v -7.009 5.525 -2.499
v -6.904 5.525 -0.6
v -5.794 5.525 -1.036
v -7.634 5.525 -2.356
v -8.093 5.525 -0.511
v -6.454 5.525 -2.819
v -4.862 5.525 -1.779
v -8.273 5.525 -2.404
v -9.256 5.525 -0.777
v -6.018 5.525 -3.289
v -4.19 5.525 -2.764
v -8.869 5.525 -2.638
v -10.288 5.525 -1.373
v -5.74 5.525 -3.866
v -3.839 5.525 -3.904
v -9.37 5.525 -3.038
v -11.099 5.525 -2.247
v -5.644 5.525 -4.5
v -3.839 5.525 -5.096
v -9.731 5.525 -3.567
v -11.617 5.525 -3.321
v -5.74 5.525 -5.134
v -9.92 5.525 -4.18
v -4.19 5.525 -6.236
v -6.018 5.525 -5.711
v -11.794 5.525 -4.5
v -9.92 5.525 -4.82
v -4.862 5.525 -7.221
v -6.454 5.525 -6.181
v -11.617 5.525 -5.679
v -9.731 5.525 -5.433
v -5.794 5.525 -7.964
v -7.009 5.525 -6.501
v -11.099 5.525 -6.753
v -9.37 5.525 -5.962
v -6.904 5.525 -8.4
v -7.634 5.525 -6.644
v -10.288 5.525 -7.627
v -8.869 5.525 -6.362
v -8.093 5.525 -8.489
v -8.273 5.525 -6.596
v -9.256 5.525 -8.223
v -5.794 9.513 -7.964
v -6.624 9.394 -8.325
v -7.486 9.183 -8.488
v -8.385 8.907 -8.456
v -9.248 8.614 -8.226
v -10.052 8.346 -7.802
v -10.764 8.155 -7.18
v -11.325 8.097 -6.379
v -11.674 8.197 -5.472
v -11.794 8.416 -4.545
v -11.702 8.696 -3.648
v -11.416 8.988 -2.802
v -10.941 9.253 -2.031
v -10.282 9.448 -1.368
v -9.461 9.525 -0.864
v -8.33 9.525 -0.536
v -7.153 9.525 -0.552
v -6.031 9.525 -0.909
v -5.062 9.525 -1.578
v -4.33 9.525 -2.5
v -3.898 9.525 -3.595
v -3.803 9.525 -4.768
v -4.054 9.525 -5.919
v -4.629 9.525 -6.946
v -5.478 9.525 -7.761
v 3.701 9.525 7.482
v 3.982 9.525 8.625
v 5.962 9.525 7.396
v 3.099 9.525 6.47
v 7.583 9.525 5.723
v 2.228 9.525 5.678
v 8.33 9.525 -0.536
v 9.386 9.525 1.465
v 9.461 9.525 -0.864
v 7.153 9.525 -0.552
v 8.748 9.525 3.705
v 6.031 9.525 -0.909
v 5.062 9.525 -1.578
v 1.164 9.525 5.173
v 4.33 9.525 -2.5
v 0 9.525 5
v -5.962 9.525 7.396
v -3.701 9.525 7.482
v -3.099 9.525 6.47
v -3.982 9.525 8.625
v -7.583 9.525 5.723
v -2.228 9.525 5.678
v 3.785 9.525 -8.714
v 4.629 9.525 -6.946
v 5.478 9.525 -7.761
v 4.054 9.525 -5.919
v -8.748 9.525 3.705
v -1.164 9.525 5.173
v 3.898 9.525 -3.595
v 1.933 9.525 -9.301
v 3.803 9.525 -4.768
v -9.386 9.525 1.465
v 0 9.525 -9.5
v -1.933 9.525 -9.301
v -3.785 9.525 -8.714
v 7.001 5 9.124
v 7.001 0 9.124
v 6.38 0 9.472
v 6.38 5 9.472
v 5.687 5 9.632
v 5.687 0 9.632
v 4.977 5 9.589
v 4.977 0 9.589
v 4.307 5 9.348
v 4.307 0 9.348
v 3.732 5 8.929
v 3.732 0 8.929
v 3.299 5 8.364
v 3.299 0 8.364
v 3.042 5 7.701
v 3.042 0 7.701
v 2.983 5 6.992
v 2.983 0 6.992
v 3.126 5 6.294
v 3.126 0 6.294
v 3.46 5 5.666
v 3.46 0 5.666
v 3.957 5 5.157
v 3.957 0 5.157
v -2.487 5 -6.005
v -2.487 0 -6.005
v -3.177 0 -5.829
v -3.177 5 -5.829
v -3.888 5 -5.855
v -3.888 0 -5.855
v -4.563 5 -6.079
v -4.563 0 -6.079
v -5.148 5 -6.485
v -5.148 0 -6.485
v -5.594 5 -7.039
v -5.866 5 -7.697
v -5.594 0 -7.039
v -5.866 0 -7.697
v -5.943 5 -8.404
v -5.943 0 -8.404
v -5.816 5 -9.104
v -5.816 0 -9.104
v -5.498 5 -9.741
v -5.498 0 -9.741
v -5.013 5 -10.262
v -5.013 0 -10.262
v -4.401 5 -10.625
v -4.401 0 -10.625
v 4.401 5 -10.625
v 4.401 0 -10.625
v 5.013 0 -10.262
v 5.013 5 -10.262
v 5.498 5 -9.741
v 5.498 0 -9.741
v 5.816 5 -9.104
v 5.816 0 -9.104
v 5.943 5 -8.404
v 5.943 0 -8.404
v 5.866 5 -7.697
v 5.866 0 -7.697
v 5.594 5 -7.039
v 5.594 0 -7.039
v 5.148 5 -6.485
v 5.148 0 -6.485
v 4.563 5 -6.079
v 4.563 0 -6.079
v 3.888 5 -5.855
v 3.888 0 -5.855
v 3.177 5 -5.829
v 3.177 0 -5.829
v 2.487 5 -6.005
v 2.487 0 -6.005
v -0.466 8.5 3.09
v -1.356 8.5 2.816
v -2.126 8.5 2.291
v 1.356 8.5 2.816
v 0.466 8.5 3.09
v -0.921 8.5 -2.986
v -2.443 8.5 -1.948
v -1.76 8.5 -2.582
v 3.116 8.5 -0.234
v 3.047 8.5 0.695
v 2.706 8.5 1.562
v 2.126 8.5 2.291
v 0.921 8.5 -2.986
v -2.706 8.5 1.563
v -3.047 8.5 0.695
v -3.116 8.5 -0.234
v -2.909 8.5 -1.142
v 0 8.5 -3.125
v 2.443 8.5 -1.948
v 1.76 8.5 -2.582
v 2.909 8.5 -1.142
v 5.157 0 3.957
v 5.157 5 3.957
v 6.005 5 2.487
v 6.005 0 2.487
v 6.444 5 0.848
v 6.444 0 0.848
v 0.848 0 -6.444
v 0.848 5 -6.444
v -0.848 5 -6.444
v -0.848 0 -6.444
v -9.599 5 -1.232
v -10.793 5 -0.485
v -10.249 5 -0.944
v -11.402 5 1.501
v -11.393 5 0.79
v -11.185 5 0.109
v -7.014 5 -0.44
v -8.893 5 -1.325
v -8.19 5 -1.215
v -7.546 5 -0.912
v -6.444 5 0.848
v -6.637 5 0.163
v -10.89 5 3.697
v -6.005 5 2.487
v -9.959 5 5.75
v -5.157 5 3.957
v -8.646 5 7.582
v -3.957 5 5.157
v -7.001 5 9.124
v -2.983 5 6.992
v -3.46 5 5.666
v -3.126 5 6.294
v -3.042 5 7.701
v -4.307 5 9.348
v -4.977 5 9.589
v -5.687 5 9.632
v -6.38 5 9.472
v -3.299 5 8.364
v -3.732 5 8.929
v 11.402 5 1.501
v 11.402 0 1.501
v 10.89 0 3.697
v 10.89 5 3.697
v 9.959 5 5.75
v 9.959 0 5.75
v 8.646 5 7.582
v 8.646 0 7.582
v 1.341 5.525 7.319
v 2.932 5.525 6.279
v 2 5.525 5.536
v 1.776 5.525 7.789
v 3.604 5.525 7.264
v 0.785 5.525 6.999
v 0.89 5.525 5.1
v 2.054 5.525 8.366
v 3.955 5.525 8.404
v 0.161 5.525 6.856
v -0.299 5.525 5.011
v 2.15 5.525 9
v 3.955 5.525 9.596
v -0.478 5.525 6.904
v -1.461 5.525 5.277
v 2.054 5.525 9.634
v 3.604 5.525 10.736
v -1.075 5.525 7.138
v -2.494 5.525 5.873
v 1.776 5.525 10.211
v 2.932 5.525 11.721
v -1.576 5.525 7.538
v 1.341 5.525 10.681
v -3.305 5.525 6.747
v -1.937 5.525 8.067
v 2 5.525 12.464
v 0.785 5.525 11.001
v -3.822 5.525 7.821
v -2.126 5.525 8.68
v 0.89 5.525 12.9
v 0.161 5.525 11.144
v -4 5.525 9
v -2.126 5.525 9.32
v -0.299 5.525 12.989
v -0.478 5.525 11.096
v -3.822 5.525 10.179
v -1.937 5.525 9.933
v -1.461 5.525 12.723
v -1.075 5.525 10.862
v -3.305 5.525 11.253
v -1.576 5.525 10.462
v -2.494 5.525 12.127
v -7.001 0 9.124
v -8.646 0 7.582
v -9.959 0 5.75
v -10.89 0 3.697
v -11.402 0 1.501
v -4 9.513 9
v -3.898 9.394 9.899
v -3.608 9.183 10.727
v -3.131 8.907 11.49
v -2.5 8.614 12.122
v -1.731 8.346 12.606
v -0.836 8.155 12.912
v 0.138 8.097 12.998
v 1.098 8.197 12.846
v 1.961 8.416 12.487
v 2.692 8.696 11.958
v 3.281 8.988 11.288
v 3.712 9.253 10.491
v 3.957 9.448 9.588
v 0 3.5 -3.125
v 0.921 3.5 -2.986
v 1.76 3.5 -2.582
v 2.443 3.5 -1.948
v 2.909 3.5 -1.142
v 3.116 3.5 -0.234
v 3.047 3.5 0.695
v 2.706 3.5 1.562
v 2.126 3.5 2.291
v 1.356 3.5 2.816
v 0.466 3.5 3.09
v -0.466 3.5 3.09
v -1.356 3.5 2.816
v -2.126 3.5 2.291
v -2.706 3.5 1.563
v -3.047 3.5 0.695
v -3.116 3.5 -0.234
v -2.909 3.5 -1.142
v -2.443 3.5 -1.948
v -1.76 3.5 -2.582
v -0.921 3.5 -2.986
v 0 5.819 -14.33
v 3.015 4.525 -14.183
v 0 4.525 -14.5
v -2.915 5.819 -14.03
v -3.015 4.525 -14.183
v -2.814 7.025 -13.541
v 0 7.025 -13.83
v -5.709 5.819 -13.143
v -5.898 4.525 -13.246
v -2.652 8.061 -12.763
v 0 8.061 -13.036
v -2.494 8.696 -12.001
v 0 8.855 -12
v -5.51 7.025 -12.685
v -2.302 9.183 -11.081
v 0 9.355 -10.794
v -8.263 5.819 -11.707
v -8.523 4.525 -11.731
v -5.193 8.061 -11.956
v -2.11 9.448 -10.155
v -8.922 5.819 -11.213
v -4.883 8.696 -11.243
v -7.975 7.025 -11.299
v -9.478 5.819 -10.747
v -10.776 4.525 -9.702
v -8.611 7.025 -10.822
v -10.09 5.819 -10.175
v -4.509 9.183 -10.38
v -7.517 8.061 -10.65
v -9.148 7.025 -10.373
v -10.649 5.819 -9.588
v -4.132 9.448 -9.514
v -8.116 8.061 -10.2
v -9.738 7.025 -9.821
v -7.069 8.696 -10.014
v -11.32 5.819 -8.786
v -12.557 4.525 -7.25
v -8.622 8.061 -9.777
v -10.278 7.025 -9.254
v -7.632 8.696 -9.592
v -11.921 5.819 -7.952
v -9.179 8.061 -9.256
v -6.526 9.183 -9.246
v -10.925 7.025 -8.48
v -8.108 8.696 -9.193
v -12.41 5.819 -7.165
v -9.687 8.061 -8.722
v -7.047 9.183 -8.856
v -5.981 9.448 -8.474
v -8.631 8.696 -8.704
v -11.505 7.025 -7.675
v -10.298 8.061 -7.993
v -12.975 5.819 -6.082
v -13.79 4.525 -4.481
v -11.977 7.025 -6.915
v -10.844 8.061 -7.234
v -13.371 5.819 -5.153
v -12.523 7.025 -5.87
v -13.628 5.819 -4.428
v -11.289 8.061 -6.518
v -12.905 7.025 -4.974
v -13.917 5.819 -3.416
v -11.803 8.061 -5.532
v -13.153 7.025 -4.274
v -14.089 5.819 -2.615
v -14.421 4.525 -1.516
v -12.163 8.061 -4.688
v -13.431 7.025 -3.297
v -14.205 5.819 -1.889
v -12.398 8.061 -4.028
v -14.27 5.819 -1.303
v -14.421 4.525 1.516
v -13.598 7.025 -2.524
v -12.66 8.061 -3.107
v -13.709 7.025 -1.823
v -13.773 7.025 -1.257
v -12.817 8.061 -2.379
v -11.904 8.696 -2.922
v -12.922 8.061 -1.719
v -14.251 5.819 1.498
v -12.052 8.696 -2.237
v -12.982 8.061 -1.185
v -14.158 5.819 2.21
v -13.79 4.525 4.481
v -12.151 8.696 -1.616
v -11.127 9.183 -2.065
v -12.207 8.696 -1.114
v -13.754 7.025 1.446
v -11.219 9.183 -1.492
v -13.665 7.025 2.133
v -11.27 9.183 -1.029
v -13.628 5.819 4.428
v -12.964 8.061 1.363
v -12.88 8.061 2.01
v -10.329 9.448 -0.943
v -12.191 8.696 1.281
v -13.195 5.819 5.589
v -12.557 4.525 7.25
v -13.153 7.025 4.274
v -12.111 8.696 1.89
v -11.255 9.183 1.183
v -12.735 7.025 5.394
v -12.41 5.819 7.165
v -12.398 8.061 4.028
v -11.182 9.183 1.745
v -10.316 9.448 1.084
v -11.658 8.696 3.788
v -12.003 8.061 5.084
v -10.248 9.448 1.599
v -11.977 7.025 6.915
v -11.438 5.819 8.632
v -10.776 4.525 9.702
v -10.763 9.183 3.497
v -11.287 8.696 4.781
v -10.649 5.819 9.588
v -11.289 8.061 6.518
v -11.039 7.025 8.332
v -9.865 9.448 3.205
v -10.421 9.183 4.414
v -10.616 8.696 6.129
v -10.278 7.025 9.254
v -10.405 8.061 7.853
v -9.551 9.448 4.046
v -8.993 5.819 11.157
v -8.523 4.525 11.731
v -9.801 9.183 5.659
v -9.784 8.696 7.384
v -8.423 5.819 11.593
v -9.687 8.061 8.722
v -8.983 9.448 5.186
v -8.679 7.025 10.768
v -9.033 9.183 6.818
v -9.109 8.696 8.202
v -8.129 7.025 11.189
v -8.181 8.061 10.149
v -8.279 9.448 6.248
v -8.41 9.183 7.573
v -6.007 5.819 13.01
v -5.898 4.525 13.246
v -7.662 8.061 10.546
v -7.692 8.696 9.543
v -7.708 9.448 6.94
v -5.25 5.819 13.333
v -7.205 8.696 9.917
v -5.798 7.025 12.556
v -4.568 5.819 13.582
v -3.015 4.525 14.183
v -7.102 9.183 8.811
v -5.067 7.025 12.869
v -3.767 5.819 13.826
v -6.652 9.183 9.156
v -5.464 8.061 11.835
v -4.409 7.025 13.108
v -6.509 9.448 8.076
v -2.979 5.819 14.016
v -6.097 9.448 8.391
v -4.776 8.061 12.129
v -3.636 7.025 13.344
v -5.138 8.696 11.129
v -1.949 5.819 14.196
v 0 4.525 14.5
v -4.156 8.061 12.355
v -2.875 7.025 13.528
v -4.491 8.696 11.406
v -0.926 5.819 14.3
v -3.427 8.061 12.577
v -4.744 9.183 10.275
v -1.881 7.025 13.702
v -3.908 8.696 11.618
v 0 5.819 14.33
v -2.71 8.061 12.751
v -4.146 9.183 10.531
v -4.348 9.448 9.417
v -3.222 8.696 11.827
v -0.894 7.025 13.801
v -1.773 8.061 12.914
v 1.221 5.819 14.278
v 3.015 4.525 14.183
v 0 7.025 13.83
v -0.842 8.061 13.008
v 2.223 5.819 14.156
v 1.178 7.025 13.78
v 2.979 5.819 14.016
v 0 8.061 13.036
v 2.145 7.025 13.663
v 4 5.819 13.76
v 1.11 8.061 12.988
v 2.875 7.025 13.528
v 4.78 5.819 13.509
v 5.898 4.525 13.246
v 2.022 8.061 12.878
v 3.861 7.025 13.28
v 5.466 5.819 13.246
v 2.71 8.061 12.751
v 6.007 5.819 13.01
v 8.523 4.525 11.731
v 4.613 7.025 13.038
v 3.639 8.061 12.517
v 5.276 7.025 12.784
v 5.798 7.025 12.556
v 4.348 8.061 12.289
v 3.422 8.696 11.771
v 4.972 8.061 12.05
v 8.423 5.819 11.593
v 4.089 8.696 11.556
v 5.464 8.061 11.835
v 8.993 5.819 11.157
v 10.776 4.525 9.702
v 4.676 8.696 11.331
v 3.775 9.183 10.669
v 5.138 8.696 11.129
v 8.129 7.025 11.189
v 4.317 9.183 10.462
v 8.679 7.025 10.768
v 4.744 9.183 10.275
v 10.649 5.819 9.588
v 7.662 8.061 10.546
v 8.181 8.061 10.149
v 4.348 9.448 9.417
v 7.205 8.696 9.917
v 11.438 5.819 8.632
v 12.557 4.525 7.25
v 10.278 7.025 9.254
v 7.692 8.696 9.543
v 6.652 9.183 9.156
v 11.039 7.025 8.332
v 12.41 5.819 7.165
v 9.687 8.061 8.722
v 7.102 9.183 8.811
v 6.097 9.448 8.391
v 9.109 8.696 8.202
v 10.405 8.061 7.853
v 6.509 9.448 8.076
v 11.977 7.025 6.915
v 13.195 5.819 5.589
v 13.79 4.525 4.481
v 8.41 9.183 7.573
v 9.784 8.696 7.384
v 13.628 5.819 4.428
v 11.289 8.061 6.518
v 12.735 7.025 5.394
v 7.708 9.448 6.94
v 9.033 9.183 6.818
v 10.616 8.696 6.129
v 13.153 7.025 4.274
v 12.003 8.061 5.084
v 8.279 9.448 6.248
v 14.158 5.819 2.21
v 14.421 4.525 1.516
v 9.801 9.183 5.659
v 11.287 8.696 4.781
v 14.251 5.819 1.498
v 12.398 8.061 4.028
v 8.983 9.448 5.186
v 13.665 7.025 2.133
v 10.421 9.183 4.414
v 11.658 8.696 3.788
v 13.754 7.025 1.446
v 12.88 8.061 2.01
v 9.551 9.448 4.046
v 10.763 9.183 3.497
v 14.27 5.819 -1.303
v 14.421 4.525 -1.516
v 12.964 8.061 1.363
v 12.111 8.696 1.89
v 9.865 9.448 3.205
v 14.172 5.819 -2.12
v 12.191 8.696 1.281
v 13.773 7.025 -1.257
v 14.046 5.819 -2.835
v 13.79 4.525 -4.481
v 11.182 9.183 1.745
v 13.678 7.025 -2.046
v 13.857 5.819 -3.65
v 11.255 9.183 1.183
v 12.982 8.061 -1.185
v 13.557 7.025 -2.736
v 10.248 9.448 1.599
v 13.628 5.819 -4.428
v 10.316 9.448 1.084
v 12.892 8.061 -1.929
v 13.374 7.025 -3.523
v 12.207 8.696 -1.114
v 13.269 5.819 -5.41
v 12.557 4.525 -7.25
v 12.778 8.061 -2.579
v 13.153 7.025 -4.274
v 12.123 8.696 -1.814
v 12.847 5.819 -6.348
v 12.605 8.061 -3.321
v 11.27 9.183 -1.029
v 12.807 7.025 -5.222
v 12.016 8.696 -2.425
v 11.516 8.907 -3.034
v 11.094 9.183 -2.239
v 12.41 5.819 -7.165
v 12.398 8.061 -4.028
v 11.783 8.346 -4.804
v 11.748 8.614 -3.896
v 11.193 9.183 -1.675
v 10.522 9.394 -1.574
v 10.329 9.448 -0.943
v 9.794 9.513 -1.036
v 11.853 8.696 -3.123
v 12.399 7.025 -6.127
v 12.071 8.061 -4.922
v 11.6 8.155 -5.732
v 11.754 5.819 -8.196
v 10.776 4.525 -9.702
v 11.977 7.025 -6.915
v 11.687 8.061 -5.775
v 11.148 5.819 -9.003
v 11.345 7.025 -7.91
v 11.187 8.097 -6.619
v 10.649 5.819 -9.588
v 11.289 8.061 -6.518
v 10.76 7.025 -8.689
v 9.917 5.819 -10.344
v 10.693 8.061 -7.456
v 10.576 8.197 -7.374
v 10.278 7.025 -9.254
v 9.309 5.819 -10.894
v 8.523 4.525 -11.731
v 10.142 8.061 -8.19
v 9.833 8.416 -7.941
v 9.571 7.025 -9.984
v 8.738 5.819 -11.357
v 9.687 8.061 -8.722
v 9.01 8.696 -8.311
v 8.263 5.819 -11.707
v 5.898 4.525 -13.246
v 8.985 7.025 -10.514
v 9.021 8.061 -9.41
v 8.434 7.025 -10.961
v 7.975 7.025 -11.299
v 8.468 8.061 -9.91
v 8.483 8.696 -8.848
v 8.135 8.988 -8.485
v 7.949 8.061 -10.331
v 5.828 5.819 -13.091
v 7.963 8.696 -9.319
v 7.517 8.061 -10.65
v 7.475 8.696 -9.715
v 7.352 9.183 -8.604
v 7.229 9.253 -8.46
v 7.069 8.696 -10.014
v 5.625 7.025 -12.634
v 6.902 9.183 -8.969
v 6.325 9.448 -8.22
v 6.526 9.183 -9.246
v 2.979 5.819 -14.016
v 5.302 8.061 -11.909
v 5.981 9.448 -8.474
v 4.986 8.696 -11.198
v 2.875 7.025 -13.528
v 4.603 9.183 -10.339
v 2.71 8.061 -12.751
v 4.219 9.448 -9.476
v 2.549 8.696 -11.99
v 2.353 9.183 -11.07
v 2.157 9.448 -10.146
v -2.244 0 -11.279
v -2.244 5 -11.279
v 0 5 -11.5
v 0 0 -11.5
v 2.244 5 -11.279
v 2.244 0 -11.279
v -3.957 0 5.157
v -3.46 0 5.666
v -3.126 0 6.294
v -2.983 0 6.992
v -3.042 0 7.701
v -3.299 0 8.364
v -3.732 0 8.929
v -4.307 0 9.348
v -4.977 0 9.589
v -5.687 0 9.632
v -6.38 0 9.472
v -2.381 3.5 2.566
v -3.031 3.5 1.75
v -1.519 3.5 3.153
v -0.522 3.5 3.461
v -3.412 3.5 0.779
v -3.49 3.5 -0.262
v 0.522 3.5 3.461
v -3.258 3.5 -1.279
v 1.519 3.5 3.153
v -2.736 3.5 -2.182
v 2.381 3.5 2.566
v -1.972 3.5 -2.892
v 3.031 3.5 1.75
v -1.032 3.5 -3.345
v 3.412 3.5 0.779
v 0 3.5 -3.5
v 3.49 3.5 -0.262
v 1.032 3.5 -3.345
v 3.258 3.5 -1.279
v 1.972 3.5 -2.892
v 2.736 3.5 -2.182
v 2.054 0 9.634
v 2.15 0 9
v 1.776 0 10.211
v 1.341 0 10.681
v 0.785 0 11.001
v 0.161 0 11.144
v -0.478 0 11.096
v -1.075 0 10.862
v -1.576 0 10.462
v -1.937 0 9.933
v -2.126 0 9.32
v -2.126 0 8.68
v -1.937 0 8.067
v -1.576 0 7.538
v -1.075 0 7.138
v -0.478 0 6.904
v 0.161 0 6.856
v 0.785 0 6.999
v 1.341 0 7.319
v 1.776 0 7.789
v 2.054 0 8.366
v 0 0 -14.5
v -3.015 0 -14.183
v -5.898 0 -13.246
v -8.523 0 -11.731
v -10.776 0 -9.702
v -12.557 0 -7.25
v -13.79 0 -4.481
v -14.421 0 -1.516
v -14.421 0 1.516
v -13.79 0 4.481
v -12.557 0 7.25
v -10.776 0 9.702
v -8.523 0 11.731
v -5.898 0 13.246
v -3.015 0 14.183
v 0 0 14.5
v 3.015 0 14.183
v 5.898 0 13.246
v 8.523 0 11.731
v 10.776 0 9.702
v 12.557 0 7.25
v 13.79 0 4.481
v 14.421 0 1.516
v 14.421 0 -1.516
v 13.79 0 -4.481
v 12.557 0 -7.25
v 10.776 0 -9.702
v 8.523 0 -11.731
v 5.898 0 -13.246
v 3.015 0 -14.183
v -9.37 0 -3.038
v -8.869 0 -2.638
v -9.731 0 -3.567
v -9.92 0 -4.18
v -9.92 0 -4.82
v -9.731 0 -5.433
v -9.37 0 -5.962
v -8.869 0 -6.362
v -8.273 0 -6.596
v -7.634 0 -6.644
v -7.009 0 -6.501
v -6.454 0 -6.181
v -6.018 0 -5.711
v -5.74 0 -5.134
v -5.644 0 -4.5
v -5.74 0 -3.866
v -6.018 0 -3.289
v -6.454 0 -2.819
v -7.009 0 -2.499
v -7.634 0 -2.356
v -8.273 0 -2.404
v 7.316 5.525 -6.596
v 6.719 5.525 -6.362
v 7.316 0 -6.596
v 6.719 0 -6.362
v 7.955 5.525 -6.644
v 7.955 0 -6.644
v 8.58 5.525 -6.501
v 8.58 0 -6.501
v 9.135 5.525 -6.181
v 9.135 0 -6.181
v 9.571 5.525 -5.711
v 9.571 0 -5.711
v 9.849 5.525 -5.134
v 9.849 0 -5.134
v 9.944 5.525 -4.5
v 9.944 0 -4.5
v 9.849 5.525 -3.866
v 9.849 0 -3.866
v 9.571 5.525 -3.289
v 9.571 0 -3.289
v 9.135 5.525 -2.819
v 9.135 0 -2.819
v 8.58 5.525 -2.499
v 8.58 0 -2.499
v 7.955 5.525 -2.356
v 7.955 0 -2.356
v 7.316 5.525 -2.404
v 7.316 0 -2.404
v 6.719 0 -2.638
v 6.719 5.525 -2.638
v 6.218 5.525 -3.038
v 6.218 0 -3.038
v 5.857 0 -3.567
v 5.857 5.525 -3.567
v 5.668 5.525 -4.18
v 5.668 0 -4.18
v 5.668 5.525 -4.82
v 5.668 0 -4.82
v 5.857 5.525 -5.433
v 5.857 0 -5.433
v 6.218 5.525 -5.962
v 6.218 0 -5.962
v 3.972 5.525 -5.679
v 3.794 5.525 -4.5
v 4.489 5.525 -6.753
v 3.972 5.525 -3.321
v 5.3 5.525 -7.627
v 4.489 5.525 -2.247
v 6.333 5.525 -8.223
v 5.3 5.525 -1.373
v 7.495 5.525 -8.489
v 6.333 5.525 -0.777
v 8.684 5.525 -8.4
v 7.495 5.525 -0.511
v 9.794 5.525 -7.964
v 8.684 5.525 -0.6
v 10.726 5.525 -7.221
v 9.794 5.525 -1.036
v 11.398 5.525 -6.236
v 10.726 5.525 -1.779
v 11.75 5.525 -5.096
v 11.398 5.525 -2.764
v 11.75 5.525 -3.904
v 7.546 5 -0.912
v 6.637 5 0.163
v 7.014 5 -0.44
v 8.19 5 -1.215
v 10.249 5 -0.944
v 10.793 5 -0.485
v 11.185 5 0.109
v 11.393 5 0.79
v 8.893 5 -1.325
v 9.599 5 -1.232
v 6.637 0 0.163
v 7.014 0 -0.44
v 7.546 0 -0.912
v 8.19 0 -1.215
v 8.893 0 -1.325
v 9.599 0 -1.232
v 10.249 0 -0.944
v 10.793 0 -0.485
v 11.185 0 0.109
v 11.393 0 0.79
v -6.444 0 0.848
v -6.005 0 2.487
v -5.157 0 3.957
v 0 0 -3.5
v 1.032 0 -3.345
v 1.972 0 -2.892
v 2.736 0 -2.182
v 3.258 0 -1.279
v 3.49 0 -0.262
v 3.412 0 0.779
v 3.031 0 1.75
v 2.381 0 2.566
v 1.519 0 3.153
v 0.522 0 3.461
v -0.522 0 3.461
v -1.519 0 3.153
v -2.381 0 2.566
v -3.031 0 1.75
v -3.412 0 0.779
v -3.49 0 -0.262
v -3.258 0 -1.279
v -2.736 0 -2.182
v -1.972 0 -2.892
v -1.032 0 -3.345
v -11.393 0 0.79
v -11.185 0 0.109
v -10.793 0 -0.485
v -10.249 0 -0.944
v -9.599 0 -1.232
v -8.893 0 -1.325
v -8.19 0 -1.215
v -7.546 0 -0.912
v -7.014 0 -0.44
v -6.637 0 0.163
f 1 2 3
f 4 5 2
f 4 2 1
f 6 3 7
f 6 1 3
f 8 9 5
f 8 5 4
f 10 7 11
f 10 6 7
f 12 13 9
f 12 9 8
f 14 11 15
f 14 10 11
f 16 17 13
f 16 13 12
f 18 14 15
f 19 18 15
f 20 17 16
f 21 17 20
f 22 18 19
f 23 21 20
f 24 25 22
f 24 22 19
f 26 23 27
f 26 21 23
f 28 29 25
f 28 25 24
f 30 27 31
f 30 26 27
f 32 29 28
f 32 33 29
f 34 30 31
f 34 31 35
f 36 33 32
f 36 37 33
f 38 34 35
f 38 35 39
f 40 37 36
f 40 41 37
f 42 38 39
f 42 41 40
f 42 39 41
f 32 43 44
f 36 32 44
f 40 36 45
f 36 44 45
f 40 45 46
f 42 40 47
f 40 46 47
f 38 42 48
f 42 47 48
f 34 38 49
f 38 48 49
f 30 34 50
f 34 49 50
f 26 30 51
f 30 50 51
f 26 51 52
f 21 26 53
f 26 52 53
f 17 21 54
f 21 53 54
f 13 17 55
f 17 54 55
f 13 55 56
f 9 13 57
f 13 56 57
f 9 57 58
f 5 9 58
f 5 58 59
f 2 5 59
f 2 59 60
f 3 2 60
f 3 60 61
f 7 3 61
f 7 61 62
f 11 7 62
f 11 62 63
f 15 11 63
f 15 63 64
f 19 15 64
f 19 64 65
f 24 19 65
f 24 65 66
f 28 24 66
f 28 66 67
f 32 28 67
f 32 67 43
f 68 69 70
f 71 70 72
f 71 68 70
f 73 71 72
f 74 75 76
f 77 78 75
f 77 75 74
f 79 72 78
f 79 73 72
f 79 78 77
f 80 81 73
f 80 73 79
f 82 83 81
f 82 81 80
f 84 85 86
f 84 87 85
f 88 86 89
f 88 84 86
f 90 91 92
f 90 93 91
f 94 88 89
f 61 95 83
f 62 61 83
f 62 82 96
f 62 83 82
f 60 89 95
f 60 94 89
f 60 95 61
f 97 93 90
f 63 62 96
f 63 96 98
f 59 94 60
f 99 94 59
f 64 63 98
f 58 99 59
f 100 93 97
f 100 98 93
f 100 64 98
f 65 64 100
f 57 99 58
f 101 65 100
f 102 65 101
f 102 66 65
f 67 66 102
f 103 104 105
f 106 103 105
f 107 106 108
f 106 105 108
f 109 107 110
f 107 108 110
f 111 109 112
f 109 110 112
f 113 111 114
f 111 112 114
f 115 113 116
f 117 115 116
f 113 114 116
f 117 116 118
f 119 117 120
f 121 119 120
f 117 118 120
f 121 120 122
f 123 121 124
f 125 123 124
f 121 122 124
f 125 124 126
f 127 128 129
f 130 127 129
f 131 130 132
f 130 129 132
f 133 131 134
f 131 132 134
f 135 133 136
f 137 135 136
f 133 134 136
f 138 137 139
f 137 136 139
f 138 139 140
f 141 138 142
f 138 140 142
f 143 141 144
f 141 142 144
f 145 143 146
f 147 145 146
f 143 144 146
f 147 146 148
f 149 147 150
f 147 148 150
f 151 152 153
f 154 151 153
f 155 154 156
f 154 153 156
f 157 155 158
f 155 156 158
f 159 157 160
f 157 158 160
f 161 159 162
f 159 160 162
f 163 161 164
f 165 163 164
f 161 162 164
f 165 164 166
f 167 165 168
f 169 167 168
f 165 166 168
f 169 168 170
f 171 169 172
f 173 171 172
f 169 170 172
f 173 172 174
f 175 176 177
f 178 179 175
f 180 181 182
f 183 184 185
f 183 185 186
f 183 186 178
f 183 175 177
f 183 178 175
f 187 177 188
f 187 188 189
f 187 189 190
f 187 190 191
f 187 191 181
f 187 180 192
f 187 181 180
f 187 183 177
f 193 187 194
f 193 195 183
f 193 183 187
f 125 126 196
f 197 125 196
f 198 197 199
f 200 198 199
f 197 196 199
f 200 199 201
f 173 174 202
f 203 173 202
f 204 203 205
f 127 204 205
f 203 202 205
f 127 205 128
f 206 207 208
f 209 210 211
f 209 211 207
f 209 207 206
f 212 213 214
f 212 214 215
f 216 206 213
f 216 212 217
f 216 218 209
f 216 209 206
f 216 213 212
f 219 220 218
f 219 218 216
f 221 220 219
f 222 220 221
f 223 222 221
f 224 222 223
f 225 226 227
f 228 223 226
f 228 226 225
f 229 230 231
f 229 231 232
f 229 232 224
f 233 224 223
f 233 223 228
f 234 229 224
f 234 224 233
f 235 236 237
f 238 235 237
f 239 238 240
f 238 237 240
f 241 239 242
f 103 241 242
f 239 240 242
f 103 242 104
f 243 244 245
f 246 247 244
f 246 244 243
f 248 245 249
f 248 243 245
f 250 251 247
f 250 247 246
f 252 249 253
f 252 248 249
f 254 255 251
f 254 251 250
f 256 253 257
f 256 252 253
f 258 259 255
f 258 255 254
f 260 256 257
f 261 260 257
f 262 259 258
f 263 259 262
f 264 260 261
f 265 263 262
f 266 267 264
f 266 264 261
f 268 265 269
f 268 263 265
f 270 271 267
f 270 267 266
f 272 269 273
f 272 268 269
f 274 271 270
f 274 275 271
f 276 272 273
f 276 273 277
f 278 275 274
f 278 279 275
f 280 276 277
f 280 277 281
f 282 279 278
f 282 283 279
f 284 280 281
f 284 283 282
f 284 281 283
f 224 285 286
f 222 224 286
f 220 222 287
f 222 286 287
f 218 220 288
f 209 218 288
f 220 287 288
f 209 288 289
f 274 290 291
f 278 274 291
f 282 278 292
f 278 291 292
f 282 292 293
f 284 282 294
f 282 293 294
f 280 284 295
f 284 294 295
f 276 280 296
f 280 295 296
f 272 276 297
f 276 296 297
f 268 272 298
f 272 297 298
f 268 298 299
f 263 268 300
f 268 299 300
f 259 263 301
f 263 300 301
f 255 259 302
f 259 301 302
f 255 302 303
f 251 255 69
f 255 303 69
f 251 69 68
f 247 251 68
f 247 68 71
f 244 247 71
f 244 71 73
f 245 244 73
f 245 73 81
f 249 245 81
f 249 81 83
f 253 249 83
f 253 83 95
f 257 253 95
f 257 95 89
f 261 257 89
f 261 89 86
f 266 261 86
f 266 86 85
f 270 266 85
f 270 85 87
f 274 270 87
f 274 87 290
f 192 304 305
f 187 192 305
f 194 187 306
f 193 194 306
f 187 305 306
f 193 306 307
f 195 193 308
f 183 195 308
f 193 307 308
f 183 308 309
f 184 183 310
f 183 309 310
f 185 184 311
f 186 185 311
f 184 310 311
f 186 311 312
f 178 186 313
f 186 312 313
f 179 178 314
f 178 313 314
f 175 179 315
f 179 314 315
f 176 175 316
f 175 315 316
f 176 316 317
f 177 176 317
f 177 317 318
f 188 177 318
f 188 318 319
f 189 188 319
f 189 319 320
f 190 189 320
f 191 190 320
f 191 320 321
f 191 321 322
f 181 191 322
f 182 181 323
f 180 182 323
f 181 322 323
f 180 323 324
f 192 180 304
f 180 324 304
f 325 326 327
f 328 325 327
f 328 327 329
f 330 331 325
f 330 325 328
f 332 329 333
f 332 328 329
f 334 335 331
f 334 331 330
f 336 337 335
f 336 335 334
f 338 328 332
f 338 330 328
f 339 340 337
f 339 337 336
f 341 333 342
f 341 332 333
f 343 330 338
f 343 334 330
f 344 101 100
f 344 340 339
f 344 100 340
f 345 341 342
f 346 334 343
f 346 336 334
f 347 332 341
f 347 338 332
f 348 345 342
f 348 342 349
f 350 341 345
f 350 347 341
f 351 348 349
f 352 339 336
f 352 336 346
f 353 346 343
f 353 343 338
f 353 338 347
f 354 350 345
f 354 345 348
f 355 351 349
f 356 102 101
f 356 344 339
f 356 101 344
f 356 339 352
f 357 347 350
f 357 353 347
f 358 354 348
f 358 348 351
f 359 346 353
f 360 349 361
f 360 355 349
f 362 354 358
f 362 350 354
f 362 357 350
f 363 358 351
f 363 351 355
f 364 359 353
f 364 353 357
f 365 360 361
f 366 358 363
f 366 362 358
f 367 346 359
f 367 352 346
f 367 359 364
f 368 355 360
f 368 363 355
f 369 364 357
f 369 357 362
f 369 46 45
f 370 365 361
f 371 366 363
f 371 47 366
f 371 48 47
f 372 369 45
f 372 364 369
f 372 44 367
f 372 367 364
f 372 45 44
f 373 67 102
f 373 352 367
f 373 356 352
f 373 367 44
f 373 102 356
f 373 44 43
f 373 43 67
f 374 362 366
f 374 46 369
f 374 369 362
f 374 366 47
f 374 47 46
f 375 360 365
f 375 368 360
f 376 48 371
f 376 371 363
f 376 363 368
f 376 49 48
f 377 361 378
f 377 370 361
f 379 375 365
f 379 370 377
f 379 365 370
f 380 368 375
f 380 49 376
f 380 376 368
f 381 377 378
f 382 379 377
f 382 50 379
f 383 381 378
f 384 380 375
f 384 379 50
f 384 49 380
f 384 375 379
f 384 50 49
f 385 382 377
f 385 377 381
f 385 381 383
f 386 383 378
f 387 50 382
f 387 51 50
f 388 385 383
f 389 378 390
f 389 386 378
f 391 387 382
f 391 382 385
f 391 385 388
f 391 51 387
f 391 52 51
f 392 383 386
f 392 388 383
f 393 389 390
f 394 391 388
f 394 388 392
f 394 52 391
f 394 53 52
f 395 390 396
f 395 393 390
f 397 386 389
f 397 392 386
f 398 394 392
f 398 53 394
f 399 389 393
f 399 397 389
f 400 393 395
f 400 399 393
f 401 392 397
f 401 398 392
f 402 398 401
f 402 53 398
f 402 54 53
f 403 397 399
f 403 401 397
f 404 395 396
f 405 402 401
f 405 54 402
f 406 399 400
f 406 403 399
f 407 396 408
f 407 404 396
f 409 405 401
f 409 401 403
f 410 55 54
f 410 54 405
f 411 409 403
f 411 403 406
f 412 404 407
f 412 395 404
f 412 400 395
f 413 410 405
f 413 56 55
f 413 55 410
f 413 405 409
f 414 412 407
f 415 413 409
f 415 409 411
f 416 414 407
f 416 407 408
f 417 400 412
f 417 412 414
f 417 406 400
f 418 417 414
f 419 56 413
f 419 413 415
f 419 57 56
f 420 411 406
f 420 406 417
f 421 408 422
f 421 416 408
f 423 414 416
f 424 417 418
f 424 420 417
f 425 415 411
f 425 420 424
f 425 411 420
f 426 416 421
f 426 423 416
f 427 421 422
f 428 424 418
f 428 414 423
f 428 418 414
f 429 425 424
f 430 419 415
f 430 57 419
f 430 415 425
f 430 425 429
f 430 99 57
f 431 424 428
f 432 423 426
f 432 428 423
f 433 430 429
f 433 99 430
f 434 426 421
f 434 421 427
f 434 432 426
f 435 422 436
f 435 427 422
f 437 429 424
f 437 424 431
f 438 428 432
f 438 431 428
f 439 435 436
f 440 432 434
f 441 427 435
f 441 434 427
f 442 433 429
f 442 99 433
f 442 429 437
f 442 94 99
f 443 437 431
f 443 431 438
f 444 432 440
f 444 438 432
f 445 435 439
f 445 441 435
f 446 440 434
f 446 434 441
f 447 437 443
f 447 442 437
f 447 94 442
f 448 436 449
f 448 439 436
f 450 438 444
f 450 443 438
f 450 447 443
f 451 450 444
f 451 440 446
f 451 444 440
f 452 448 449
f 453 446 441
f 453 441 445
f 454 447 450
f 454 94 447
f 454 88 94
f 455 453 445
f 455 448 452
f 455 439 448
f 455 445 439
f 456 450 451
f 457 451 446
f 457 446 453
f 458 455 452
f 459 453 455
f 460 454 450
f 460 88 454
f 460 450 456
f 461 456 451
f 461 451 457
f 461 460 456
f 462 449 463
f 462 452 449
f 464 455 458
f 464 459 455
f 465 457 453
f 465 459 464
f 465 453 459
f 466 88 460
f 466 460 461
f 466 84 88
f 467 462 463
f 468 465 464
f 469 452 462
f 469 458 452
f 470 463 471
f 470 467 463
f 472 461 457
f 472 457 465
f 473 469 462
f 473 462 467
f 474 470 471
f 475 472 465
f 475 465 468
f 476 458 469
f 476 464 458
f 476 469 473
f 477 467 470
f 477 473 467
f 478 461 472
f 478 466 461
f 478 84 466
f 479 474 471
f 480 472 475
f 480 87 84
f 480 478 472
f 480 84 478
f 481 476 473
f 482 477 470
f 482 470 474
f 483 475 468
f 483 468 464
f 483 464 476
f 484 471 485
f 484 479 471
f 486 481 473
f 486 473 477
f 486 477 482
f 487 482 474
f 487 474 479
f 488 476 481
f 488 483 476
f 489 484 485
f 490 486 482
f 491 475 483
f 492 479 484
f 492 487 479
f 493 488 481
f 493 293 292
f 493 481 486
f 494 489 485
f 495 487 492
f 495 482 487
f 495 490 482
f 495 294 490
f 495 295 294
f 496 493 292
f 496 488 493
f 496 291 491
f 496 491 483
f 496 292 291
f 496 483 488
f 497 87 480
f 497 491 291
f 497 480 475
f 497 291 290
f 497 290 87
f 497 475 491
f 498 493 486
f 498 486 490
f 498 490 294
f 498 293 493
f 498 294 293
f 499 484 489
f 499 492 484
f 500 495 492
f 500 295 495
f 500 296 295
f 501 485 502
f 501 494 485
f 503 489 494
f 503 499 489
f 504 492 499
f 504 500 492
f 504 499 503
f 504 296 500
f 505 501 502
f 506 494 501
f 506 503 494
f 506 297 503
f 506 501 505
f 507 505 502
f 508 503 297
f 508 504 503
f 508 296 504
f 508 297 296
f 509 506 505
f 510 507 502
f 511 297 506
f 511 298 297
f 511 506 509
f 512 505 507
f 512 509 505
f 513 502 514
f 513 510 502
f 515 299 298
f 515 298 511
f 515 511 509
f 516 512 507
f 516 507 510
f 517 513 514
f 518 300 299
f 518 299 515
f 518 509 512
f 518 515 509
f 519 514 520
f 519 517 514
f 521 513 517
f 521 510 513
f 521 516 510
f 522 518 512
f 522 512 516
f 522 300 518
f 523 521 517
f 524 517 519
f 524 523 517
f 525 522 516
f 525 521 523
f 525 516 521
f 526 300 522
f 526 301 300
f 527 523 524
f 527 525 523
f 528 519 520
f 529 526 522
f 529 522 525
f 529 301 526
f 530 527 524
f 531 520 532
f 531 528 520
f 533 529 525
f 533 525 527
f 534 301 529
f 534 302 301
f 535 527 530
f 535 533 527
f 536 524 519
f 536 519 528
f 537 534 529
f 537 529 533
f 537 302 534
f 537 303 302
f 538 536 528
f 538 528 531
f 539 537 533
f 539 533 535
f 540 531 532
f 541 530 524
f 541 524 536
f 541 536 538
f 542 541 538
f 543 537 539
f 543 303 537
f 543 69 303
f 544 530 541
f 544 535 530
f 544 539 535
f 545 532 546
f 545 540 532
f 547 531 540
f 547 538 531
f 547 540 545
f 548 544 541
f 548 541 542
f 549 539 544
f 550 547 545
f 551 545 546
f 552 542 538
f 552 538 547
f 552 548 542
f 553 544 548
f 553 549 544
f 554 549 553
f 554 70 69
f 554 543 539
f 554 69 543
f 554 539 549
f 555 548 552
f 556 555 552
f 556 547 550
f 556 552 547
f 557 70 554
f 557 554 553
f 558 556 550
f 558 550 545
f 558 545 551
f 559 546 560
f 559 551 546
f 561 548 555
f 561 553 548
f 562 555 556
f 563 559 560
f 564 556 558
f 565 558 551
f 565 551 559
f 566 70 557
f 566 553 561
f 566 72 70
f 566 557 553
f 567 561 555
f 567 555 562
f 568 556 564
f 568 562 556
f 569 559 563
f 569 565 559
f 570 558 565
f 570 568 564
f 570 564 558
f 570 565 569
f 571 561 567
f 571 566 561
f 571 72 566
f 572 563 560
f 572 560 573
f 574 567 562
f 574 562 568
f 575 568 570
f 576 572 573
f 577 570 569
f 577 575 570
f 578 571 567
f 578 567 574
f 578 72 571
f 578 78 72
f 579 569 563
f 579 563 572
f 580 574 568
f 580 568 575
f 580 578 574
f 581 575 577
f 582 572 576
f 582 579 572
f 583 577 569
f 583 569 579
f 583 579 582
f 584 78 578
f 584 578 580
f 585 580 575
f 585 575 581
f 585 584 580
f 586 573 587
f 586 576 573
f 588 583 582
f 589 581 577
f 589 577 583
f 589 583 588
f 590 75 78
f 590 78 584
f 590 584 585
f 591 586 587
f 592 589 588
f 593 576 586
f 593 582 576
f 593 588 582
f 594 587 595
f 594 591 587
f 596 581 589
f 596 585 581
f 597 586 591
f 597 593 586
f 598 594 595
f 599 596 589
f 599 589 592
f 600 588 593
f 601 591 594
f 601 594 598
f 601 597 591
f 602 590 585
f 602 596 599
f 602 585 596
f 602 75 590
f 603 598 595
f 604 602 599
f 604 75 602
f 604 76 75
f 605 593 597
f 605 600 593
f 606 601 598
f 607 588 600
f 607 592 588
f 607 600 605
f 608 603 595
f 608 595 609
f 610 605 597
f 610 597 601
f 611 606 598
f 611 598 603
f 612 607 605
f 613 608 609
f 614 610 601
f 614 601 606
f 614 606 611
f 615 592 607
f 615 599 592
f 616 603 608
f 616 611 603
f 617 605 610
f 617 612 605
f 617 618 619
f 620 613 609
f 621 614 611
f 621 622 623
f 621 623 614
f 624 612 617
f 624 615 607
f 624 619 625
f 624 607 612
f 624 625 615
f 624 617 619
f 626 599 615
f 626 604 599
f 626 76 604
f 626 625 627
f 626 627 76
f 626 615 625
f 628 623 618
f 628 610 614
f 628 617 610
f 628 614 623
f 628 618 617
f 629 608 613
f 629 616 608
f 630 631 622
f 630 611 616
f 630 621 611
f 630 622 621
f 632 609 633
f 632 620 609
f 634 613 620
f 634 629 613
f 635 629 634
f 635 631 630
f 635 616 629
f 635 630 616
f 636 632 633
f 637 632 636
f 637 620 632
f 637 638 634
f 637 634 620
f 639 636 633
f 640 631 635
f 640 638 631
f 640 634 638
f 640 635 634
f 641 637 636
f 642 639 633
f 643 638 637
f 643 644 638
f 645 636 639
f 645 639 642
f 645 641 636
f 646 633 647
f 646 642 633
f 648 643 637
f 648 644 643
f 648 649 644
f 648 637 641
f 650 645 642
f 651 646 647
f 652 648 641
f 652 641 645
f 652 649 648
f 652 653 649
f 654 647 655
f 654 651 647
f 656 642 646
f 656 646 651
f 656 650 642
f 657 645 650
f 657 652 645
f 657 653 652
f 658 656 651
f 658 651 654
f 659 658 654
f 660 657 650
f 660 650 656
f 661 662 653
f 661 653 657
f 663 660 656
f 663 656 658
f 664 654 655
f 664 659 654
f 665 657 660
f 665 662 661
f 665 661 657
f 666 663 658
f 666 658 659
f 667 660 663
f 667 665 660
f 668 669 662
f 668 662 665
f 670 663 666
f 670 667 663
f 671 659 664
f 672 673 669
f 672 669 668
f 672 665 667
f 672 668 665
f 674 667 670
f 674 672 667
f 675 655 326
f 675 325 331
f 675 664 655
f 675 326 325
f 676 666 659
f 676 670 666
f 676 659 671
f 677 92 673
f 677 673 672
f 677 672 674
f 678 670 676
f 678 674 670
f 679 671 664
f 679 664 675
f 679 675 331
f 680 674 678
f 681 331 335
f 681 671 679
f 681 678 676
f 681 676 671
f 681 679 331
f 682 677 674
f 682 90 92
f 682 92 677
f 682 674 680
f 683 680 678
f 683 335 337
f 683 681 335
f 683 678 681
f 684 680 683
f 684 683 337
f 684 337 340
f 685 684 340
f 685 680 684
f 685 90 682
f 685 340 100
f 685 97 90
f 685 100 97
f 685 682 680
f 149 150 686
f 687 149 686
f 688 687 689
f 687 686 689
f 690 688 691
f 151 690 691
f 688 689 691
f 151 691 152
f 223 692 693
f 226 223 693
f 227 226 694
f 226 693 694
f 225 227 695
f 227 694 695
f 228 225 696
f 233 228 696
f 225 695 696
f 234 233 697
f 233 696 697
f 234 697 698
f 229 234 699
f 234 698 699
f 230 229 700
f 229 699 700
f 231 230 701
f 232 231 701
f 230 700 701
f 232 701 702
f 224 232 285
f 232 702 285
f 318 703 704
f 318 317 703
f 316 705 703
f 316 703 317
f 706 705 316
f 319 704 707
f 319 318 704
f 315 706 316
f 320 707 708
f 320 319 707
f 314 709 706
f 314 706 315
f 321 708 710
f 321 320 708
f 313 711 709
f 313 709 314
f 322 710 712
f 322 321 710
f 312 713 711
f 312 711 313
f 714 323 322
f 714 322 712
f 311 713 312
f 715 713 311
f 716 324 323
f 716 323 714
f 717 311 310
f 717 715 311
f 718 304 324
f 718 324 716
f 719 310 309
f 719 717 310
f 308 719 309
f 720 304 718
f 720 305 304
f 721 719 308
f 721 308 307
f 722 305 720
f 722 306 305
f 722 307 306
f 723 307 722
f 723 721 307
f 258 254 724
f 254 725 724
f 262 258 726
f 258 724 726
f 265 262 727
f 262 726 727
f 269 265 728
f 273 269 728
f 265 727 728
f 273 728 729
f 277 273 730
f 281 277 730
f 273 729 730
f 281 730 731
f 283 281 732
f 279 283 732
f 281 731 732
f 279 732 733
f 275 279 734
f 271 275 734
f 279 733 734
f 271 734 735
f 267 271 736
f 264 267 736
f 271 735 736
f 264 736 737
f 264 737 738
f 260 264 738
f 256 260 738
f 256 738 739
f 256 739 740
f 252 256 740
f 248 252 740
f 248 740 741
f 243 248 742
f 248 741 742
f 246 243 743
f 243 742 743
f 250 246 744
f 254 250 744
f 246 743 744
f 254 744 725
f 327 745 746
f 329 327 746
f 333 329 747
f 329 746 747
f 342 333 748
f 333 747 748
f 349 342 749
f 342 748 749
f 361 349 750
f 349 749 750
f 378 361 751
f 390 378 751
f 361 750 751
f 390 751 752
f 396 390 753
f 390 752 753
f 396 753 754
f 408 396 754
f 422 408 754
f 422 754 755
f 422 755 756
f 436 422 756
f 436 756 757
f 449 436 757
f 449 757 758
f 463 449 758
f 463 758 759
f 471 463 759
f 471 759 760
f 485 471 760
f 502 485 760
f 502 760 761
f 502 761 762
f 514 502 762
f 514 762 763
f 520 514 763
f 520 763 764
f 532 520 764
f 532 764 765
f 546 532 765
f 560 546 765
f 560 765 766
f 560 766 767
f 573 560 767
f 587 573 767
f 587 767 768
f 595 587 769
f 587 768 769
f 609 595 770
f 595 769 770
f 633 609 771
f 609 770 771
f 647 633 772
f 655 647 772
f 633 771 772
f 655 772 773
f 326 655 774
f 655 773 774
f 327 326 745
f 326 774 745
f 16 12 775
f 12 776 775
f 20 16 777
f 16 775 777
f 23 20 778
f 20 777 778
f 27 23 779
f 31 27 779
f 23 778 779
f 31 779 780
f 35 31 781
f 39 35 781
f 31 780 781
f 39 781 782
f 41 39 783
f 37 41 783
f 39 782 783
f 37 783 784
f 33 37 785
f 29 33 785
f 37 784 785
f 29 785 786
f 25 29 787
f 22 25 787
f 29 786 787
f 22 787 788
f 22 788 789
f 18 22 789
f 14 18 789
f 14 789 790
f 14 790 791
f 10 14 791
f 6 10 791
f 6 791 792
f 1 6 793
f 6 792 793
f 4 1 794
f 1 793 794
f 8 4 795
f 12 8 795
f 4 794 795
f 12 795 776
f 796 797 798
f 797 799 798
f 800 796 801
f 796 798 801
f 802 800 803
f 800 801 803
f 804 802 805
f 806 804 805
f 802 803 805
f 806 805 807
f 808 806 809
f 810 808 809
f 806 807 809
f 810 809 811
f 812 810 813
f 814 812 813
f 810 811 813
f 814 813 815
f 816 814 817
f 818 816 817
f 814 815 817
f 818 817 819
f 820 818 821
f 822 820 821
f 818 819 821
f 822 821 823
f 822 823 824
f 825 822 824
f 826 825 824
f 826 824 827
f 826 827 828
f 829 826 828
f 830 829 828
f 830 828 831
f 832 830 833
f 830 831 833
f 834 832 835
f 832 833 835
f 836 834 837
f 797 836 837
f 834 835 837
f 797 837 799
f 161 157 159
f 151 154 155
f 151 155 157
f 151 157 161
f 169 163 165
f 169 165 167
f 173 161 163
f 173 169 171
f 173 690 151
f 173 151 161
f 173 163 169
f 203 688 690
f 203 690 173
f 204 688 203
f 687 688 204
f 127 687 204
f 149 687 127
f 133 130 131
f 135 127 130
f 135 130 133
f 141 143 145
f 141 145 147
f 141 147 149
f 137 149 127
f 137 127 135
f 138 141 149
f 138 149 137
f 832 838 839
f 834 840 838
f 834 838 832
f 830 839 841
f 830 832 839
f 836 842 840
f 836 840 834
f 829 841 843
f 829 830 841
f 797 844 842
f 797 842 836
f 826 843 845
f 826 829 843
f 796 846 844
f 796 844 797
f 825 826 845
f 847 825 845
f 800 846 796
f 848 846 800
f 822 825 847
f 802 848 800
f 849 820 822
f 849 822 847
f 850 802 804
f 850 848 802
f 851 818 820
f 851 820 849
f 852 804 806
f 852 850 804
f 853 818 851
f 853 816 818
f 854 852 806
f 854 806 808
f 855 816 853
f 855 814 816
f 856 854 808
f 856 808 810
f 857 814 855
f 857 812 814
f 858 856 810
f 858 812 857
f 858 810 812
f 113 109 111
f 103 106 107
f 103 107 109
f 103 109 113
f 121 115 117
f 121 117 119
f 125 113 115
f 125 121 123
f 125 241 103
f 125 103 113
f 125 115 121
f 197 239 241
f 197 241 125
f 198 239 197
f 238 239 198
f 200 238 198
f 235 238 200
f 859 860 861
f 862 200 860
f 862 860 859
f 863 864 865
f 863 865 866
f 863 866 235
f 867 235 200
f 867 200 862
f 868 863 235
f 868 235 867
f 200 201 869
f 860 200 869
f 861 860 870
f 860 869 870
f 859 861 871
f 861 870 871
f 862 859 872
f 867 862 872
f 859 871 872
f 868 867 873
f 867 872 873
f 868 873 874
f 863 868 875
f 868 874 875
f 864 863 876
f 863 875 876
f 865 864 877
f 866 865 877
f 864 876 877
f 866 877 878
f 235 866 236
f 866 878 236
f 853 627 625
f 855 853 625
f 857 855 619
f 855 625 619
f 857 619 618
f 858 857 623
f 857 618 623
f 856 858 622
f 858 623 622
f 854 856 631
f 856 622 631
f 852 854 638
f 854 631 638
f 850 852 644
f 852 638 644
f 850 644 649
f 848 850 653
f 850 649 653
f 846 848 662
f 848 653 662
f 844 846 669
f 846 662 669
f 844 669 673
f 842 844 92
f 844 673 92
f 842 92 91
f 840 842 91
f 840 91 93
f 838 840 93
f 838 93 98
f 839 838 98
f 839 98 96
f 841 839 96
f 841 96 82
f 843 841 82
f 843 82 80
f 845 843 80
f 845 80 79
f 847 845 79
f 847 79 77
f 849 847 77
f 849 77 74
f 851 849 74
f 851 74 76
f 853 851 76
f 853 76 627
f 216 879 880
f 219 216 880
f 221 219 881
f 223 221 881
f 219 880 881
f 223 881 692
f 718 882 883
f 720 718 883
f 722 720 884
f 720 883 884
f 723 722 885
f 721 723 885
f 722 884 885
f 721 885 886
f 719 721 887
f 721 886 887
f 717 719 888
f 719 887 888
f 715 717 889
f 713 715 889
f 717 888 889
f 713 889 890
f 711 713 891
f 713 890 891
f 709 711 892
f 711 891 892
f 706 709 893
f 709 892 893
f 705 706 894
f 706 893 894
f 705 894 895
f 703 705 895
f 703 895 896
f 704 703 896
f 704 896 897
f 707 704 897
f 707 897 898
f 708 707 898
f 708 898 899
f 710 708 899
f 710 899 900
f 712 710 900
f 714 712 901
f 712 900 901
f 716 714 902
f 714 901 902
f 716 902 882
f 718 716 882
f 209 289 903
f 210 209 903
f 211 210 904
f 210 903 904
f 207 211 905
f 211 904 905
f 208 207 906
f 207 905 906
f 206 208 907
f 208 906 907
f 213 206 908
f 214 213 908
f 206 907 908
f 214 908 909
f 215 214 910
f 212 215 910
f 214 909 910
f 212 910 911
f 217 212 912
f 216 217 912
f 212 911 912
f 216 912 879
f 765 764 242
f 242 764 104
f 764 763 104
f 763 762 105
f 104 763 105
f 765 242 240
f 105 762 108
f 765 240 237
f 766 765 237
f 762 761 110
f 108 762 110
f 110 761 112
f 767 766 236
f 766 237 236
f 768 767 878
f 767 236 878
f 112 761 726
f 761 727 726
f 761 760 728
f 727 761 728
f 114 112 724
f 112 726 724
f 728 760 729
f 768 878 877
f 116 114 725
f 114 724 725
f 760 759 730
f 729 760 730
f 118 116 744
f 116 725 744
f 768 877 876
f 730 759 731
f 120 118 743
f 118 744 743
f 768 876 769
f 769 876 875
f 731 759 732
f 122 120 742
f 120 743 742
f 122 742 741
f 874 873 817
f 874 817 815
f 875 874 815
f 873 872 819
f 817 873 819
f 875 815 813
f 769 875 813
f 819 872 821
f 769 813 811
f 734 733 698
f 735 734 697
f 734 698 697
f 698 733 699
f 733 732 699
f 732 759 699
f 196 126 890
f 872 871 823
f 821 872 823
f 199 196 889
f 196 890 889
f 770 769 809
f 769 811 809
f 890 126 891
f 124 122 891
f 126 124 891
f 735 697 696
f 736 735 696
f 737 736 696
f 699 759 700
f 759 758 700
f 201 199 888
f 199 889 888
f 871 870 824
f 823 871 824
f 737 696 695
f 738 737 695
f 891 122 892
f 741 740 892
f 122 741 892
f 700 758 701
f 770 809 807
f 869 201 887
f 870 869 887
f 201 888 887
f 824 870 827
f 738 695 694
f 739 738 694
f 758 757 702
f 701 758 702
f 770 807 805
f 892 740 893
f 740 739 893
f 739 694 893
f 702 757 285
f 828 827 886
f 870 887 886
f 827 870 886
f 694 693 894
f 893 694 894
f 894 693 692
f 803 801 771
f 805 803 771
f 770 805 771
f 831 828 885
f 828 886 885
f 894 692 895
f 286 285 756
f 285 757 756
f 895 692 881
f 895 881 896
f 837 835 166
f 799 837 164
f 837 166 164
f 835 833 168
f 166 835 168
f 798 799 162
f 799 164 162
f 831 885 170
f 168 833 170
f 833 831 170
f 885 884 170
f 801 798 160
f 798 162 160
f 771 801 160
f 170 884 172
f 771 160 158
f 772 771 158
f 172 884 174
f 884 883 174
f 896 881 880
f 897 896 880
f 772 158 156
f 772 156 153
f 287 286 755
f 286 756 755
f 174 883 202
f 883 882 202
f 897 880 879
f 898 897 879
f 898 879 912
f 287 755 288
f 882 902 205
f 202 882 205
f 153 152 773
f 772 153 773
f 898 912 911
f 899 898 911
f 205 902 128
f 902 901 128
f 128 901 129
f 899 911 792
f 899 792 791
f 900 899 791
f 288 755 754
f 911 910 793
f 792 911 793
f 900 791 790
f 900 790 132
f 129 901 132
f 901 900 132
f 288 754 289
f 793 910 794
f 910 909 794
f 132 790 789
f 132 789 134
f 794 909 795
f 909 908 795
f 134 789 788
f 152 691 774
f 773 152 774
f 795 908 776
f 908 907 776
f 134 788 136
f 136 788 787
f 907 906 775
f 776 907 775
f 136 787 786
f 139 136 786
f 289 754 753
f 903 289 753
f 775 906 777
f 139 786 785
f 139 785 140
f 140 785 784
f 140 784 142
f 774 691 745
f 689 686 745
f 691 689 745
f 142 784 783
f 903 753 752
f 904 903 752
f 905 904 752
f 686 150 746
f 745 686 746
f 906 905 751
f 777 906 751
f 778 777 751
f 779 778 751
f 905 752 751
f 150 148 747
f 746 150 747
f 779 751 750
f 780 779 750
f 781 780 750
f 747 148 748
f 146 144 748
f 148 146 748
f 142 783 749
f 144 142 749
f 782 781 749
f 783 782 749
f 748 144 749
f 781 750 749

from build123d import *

# Parameters (mm, degrees)
SKETCH1_R                      = 14.5
BOSS_EXTRUDE1_DEPTH            = 9.525
SKETCH2_R                      = 3.5
CUT_EXTRUDE1_DEPTH             = 3.5
SKETCH3_R                      = 3.125
CUT_EXTRUDE2_DEPTH             = 5
CBORE_FOR_M4_SHCS1_D           = 4.3
CBORE_FOR_M4_SHCS1_CBORE_D     = 8
CBORE_FOR_M4_SHCS1_CBORE_DEPTH = 4
CIRPATTERN1_COUNT              = 3
FILLET1_R                      = 5
CUT_EXTRUDE3_DEPTH             = 5
CIRPATTERN2_COUNT              = 3


with BuildPart() as part:
    # Sketch1 → Boss-Extrude1 (new body)
    with BuildSketch(Plane(origin=(0, 0, 0), x_dir=(1, 0, 0), z_dir=(0, 1, 0))):
        with Locations(Location((0, 0, 0), (0, 0, 90))):
            Circle(SKETCH1_R)
    extrude(amount=BOSS_EXTRUDE1_DEPTH)

    # Sketch2 → Cut-Extrude1 (cut)
    with BuildSketch(Plane.XZ):
        with Locations(Location((0, 0, 0), (0, 0, 270))):
            Circle(SKETCH2_R)
    extrude(amount=-CUT_EXTRUDE1_DEPTH, mode=Mode.SUBTRACT)

    # Sketch3 → Cut-Extrude2 (cut)
    with BuildSketch(Plane.XZ.offset(-3.5)):
        with Locations(Location((0, 0, 0), (0, 0, 270))):
            Circle(SKETCH3_R)
    extrude(amount=-CUT_EXTRUDE2_DEPTH, mode=Mode.SUBTRACT)

    # CBORE for M4 SHCS1 (through all)
    with Locations(Plane(origin=(0, 9.525, 0), x_dir=(-1, 0, 0), z_dir=(0, 1, 0))):
        with Locations((0, 9)):
            cbore_for_m4_shcs1 = CounterBoreHole(CBORE_FOR_M4_SHCS1_D / 2, CBORE_FOR_M4_SHCS1_CBORE_D / 2, CBORE_FOR_M4_SHCS1_CBORE_DEPTH)

    # CirPattern1: CBORE for M4 SHCS1 ×3 about axis
    cirpattern1_axis = Axis((0, 0, 0), (0, 1, 0))
    for i in range(1, CIRPATTERN1_COUNT):
        add(cbore_for_m4_shcs1.rotate(cirpattern1_axis, i * 360 / CIRPATTERN1_COUNT), mode=Mode.SUBTRACT)

    # Fillet1
    # the kernel refuses this fillet: 5 mm, written as the material it takes off along each edge
    with BuildSketch(Plane(origin=(0, 9.525, 0), x_dir=(0, 0, -1), z_dir=(1, 0, 0))) as fillet1_piece_1:
        with BuildLine():
            CenterArc((14.5 - FILLET1_R, -FILLET1_R), FILLET1_R, 0, 90)
            Line((14.5 - FILLET1_R, 0), (14.5, 0))
            Line((14.5, 0), (14.5, -FILLET1_R))
        make_face()
    revolve(axis=Axis((0, 9.525, 0), (0, 1, 0)), mode=Mode.SUBTRACT)

    # Sketch6 → Cut-Extrude3 (cut)
    with BuildSketch(Plane.XZ):
        with BuildLine():
            ThreePointArc((-11.401615906, 1.501051211), (-9.249319233, -1.303876423), (-6.444391599, 0.848420249))
            ThreePointArc((-6.444391599, 0.848420249), (-5.629165125, 3.25), (-3.956949289, 5.156796712))
            ThreePointArc((-3.956949289, 5.156796712), (-3.49546951, 8.662083635), (-7.000756434, 9.123563413))
            ThreePointArc((-7.000756434, 9.123563413), (-9.959292144, 5.75), (-11.401615906, 1.501051211))
        make_face()
    cut_extrude3 = extrude(amount=-CUT_EXTRUDE3_DEPTH, mode=Mode.SUBTRACT)

    # CirPattern2: Cut-Extrude3 ×3 about axis
    cirpattern2_axis = Axis((0, 0, 0), (0, 1, 0))
    for i in range(1, CIRPATTERN2_COUNT):
        add(cut_extrude3.rotate(cirpattern2_axis, i * 360 / CIRPATTERN2_COUNT), mode=Mode.SUBTRACT)


solid = part.part
